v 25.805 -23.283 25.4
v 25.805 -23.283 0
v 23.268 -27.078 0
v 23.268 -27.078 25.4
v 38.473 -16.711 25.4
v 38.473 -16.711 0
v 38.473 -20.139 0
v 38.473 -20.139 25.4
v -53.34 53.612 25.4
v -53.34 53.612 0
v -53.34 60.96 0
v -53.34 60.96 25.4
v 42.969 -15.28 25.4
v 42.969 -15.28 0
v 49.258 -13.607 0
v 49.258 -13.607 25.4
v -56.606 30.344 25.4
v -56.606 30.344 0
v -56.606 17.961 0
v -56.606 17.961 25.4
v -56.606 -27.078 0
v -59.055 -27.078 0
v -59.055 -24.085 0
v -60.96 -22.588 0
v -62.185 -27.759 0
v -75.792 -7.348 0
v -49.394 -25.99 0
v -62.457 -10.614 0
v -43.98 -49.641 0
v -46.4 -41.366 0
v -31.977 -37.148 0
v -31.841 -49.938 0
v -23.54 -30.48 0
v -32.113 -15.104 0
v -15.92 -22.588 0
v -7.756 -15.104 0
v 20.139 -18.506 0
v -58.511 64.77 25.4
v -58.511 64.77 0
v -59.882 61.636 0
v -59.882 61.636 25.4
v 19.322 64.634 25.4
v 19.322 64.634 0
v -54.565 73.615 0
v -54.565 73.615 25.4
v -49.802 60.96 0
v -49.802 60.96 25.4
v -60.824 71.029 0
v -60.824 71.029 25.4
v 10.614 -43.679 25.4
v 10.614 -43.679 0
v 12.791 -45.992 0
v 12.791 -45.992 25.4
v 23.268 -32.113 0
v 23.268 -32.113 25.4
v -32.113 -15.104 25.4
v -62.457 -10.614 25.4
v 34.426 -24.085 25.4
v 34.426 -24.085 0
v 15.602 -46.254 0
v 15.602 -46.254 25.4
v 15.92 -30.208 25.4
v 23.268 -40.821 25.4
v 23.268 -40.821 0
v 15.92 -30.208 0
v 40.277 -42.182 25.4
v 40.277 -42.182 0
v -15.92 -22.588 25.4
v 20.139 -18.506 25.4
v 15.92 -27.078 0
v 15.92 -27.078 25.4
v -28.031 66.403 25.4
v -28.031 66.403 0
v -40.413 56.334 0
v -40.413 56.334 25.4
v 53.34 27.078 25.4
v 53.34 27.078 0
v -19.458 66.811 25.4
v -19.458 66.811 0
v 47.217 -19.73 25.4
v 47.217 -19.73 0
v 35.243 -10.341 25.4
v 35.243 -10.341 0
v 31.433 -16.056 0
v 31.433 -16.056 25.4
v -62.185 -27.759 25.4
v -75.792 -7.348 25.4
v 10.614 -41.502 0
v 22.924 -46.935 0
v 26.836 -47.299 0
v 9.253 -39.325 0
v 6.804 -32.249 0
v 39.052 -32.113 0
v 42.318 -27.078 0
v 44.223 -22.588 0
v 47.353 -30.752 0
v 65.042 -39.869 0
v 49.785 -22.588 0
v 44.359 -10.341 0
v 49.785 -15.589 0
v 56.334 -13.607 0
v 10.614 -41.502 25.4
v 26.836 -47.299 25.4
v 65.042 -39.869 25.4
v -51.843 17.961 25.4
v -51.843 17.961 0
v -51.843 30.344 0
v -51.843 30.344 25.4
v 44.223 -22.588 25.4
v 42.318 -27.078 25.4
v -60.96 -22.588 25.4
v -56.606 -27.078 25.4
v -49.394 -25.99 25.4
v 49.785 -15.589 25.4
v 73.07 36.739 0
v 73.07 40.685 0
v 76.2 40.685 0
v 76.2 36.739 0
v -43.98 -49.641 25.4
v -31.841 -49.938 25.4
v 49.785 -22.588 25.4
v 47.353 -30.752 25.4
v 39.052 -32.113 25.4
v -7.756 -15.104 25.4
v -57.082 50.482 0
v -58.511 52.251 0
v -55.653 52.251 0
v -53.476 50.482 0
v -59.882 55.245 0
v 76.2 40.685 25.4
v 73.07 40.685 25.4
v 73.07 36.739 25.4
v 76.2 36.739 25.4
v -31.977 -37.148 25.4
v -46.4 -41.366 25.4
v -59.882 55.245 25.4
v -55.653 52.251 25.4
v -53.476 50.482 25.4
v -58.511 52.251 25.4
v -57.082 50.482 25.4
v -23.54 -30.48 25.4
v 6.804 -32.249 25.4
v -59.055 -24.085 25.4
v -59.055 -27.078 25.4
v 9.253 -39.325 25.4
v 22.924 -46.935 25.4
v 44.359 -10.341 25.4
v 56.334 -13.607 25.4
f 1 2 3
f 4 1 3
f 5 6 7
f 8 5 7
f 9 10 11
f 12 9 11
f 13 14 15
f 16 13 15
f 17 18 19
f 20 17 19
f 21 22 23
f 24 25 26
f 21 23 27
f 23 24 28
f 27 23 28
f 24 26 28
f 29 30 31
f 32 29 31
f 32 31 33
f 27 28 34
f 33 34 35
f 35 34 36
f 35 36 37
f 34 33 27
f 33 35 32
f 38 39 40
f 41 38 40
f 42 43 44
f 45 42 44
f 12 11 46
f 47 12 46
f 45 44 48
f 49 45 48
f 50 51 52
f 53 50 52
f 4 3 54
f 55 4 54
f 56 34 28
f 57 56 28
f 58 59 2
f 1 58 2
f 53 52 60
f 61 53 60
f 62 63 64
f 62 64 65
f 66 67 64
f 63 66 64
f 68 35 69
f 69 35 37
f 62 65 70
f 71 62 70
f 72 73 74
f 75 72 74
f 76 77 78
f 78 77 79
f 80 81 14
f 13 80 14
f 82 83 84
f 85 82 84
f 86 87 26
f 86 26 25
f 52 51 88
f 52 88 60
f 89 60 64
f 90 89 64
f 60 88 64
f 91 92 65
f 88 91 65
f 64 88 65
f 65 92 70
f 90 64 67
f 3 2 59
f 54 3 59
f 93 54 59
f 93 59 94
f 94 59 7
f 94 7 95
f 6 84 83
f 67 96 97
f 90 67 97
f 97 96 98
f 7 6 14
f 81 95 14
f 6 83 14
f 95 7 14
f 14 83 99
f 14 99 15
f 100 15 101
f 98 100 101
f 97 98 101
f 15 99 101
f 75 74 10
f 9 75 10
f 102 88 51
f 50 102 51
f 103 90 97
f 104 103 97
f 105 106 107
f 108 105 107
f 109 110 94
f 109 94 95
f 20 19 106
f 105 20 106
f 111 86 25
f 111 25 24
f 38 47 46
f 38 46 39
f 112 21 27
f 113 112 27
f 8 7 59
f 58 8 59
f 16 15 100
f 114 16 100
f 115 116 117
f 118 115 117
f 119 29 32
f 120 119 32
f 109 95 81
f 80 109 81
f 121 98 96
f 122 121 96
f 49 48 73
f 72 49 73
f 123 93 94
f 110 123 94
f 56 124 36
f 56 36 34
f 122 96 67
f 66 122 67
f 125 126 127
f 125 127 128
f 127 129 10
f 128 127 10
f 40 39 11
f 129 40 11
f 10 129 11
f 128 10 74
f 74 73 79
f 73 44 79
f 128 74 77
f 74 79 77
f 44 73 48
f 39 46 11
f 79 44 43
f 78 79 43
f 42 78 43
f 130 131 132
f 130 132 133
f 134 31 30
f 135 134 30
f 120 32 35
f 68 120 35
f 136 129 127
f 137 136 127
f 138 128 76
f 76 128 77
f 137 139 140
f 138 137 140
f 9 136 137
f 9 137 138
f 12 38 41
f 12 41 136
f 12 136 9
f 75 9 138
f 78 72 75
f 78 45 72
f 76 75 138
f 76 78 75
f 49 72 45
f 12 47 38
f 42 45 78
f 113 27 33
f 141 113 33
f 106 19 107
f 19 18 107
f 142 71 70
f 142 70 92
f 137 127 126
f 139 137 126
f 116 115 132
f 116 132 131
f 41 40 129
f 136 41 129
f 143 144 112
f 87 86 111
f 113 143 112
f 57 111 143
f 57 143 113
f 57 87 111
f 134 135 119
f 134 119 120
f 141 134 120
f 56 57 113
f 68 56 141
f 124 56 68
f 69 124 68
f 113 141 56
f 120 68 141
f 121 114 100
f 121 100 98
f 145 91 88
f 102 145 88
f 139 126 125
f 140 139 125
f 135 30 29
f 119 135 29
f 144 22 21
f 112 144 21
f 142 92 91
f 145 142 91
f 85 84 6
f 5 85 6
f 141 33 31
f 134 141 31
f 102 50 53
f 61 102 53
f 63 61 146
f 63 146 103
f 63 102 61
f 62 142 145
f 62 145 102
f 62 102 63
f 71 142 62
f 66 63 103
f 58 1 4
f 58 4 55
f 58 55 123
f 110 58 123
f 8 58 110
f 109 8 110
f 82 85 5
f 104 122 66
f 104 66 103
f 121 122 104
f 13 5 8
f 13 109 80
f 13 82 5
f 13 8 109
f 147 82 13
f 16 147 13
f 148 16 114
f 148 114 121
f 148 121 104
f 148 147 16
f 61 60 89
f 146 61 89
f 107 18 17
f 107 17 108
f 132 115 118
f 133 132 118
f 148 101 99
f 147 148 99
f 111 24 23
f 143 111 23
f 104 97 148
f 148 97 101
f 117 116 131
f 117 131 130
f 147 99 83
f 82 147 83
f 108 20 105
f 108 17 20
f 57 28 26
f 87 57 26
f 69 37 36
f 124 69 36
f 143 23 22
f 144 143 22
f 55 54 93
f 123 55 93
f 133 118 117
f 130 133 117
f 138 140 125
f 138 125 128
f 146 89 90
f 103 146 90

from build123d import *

# Parameters (mm, degrees)
F0_W     = 3.129631
F0_H     = 3.94607
F0_W_2   = 4.7625
F0_H_2   = 9.116786
F0_H_3   = 3.265712
F1_DEPTH = 25.4
F3_DEPTH = 25.4


with BuildPart() as f1:
    # F0 (on Top) → F1 (new body)
    with BuildSketch(Plane.XY):
        with Locations((74.635177, 38.712321)):
            Rectangle(F0_W, F0_H)
        with Locations((-54.224465, 22.519822)):
            Rectangle(F0_W_2, F0_H_2)
        with Locations((-54.224465, 28.711071)):
            Rectangle(F0_W_2, F0_H_3)
        Polygon((35.242502, -10.341429), (31.432502, -16.05643), (38.472609, -16.711323), (38.472609, -20.138571), (34.426071, -24.084644), (25.804761, -23.282663), (23.268215, -27.078215), (23.268215, -32.112859), (39.052498, -32.112859), (42.318217, -27.078215), (44.223215, -22.587858), (47.216784, -19.730357), (42.969148, -15.280458), (49.257856, -13.607142), (49.78521, -15.589061), (49.78521, -18.505715), (49.78521, -22.587858), (47.352858, -30.752143), (40.277146, -42.182144), (23.268215, -40.821429), (15.920358, -30.207857), (15.920358, -27.078215), (6.803571, -32.248929), (9.252857, -39.324641), (10.613573, -41.501783), (10.613573, -43.678928), (12.790714, -45.992143), (15.601738, -46.253634), (22.924207, -46.934793), (26.836423, -47.29872), (65.042146, -39.868928), (56.333572, -13.607142), (44.359285, -10.341429), align=None)
        Polygon((-62.456783, -10.613571), (-75.791784, -7.347857), (-62.184647, -27.758572), (-60.959999, -22.587858), (-59.055001, -24.084644), (-59.055001, -27.078215), (-56.605715, -27.078215), (-49.39393, -25.989644), (-23.540357, -30.480001), (-31.976786, -37.1475), (-46.400357, -41.365717), (-43.980166, -49.641205), (-31.840716, -49.938217), (-15.920358, -22.587858), (20.138571, -18.505715), (-7.756072, -15.103929), (-32.112859, -15.103929), align=None)
    extrude(amount=F1_DEPTH)


with BuildPart() as f3:
    # F2 (on Top) → F3 (new body)
    with BuildSketch(Plane.XY):
        Polygon((-54.564644, 73.614642), (-60.823932, 71.029283), (-28.030714, 66.40286), (-40.413216, 56.333575), (-53.339999, 53.612143), (-53.339999, 60.960002), (-49.802143, 60.960002), (-58.510713, 64.769998), (-59.881687, 61.636341), (-59.881687, 58.646787), (-59.881687, 55.245001), (-55.653214, 52.251428), (-58.510713, 52.251428), (-57.081964, 50.4825), (-54.564644, 50.4825), (-53.476073, 50.4825), (53.340003, 27.078215), (-19.458216, 66.81107), (19.322144, 64.633928), align=None)
    extrude(amount=F3_DEPTH)


solid = Compound([f1.part, f3.part])
